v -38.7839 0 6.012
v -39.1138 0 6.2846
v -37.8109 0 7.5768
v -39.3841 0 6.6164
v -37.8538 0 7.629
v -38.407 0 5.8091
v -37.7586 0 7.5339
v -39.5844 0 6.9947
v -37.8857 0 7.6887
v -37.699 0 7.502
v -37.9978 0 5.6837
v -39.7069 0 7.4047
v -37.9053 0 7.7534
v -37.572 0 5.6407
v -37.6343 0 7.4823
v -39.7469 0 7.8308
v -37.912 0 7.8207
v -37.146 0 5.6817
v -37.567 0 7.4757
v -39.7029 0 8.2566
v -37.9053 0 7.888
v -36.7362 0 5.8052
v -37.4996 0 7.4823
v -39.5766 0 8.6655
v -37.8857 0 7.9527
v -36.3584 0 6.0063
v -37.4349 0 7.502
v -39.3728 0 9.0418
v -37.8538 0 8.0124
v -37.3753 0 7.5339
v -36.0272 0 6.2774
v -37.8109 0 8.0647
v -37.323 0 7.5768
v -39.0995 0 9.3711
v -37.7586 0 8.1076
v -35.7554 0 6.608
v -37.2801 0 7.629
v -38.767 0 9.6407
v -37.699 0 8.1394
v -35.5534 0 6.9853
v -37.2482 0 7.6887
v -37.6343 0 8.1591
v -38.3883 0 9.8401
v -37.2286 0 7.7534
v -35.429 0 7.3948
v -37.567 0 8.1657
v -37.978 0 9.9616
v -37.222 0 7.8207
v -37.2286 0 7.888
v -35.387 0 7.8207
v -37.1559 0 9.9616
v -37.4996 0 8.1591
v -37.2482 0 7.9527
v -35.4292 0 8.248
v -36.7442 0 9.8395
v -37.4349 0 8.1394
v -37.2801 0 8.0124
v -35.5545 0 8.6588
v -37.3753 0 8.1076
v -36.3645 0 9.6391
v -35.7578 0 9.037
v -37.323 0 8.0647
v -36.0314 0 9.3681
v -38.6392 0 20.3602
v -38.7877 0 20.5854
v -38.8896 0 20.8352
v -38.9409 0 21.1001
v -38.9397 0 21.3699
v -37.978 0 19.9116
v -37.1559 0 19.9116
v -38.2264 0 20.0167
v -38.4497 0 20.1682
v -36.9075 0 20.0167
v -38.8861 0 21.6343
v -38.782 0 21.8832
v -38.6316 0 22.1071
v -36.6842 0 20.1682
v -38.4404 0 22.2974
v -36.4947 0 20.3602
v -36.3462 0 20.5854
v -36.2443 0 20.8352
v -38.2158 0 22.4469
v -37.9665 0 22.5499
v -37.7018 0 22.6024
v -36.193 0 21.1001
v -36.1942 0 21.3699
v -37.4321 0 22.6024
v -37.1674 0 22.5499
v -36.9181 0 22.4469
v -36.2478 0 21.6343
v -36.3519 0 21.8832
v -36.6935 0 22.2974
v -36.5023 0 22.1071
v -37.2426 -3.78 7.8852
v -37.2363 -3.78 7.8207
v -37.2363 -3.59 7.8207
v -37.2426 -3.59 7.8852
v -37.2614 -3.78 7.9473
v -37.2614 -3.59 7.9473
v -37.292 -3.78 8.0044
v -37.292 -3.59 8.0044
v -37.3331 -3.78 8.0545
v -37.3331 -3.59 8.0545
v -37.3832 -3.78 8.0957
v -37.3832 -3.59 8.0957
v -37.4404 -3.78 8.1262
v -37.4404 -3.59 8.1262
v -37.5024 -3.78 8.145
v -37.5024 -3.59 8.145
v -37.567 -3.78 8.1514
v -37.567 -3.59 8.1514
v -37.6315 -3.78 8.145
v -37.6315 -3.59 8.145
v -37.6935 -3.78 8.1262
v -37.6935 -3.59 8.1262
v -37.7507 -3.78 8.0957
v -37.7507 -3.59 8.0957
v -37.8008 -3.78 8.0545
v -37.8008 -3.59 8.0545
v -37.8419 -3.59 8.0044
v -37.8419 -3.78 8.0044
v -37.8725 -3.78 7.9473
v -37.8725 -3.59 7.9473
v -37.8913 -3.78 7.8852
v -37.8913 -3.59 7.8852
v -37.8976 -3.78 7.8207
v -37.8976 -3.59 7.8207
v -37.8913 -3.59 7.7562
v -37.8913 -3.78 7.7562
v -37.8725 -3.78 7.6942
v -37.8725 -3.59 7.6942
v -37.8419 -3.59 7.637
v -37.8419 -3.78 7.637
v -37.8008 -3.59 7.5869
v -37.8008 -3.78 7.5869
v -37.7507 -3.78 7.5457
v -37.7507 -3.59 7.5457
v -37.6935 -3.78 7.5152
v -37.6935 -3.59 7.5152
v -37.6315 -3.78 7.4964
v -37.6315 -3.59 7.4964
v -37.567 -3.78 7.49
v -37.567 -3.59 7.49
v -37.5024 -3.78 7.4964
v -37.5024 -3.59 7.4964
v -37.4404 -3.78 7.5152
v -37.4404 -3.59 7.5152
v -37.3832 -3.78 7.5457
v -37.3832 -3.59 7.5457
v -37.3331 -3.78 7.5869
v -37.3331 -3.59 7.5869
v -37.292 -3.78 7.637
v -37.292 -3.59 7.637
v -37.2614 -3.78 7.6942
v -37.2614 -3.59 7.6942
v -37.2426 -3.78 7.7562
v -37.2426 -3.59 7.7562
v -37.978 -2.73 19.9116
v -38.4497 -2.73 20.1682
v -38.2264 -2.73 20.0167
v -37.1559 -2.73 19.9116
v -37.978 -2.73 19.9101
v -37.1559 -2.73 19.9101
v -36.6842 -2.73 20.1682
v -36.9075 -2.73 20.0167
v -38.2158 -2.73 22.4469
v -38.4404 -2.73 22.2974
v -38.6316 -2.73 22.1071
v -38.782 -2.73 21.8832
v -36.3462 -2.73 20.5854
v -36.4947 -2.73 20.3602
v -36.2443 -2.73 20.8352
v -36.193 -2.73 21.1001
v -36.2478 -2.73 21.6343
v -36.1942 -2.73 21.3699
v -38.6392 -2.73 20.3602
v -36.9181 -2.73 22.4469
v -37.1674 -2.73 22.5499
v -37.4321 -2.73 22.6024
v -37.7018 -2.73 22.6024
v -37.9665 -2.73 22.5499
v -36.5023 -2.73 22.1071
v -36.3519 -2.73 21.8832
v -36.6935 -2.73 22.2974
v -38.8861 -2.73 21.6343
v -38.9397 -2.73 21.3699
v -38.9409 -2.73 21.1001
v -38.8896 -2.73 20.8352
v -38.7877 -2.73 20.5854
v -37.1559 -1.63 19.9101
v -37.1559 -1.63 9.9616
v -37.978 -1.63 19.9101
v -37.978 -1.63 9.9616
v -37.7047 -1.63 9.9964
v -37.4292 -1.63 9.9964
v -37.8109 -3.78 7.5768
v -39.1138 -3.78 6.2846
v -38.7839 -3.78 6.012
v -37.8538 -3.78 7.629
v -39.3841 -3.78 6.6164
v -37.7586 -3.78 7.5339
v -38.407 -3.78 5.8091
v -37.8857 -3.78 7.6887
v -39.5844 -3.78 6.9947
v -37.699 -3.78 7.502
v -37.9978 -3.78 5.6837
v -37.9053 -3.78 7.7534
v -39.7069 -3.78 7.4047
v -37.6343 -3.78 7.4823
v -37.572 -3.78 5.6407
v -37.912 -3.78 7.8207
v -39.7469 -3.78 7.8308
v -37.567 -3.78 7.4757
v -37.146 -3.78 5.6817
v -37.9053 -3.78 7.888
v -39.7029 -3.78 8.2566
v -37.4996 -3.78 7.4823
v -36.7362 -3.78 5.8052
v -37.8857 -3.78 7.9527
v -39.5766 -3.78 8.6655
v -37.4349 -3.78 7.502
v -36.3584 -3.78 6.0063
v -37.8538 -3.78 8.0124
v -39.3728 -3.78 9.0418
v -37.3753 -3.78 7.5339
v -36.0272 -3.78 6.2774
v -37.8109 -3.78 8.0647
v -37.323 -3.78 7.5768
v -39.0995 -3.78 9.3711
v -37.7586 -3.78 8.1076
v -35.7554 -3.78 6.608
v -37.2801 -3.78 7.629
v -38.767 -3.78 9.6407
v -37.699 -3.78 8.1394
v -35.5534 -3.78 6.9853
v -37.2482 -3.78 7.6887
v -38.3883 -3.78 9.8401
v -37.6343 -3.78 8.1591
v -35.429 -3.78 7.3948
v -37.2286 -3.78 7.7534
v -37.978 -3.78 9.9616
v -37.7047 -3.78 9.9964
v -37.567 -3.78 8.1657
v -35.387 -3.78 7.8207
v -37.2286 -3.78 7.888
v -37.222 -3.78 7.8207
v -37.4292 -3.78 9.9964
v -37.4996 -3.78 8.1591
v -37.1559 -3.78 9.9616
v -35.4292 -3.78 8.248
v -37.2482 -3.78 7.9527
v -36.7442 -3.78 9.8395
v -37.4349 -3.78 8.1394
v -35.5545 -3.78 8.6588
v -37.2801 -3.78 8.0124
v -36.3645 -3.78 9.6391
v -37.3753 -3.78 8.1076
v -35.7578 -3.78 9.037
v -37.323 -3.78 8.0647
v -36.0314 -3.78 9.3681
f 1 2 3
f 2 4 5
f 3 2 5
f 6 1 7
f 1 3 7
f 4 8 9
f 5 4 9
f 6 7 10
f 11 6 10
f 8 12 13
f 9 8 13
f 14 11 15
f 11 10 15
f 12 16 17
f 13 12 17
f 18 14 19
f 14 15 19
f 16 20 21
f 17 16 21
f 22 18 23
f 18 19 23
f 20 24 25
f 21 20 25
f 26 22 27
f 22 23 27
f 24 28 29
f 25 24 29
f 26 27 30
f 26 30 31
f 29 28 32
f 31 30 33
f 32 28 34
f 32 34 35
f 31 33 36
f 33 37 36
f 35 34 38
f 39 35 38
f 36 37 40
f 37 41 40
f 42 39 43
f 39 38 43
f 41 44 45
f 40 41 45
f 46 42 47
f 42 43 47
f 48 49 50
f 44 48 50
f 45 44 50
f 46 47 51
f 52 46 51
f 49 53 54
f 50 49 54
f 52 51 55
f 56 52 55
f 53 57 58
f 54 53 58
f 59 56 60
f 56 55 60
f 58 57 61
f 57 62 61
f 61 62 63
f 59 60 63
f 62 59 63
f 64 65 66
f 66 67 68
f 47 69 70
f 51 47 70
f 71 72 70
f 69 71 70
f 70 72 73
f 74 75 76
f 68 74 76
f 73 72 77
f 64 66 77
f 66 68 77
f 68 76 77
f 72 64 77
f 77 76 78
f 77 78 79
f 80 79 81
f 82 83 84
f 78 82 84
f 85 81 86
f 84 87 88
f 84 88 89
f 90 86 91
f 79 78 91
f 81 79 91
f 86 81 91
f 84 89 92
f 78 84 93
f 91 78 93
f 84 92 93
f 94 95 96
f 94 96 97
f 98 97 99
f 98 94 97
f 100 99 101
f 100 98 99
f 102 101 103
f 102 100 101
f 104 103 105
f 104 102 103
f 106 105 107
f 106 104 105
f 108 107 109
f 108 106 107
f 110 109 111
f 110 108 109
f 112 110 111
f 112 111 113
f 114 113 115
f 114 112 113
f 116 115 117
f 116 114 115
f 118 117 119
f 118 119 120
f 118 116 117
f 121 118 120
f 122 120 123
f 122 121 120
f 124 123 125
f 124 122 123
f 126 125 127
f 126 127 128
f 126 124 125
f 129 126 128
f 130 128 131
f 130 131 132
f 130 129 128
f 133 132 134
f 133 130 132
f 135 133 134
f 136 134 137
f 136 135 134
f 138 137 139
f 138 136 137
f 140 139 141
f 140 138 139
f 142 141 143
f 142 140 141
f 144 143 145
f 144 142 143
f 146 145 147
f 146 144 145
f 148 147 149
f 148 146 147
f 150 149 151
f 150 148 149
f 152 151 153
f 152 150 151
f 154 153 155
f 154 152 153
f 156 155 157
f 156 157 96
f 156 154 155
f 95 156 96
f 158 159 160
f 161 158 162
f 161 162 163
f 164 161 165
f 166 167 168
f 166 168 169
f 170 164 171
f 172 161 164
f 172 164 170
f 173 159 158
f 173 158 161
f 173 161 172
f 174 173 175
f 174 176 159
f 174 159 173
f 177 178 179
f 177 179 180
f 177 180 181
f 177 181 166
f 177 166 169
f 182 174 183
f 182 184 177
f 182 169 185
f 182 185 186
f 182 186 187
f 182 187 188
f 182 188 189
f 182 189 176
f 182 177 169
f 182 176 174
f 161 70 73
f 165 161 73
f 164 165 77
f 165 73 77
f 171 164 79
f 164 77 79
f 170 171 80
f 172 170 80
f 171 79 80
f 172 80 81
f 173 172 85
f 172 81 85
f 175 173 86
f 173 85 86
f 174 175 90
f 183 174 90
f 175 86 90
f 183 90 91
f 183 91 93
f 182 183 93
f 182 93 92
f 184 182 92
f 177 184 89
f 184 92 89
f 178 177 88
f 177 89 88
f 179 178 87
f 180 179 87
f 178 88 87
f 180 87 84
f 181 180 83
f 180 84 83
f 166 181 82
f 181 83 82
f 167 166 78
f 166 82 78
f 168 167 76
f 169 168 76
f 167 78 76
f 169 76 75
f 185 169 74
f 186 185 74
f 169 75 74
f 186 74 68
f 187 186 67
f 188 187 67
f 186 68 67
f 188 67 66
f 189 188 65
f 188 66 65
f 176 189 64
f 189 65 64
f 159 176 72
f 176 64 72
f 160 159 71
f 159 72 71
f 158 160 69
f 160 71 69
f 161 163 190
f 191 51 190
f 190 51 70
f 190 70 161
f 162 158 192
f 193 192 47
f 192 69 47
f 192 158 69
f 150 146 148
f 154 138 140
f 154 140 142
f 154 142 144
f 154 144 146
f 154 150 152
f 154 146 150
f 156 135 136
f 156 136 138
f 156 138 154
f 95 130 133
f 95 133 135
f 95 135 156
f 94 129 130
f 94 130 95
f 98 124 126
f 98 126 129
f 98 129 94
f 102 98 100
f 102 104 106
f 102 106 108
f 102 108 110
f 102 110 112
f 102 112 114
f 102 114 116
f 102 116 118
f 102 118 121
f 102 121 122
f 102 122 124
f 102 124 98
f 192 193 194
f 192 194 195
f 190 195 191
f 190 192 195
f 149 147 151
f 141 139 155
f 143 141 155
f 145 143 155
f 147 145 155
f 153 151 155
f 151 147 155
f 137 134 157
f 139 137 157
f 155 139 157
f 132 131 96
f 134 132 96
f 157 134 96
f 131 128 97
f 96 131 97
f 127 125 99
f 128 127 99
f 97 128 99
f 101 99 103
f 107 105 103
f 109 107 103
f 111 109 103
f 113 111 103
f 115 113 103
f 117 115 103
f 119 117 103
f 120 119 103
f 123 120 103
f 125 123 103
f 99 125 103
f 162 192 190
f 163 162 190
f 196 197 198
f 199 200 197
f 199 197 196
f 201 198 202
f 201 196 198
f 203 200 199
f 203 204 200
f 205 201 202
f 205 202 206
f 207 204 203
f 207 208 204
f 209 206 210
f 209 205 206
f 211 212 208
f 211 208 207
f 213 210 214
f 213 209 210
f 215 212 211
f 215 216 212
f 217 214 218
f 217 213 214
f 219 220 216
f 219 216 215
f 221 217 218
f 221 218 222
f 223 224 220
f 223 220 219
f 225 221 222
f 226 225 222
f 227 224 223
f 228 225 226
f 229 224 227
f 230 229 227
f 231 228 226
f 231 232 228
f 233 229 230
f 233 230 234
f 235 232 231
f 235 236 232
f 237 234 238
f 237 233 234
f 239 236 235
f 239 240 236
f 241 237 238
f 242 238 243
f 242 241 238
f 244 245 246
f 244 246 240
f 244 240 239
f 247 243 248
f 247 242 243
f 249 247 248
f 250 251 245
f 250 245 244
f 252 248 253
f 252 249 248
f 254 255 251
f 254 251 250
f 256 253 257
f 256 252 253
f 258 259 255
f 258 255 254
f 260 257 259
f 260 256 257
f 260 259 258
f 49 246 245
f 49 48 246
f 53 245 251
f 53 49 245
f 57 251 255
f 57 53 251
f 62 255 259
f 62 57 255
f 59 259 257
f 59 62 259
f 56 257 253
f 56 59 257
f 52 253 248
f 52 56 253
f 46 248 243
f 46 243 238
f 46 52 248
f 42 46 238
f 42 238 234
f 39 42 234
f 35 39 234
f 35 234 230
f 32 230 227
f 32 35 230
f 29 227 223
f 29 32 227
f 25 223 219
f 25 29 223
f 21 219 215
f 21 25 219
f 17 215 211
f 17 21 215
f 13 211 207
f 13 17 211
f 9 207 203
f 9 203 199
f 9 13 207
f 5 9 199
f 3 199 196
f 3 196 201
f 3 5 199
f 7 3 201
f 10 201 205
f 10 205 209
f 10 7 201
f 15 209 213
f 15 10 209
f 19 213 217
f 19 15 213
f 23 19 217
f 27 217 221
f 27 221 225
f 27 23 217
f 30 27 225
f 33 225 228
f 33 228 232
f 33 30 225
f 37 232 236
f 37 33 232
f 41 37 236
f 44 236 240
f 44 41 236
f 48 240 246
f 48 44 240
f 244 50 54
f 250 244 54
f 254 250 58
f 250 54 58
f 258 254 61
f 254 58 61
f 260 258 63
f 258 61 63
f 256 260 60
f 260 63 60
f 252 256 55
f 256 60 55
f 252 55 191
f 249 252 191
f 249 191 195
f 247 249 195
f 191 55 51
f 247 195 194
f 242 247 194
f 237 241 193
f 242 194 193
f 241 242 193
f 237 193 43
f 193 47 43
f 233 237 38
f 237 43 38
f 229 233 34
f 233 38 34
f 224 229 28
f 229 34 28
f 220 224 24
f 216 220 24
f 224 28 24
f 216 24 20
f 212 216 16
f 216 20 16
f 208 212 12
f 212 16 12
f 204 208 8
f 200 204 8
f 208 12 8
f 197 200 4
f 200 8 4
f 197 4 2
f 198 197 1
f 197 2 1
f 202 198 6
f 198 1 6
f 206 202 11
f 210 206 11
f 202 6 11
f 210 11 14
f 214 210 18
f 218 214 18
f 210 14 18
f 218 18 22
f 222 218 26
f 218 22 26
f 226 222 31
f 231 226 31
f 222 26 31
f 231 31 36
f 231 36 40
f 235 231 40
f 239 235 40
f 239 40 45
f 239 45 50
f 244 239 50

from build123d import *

# Parameters (mm, degrees)
F0_R     = 0.345
F2_DEPTH = 1.89
F3_DEPTH = 1.63
F4_DEPTH = 2.73
F5_DEPTH = 1.89
F6_R     = 0.3306910567
F7_DEPTH = 0.19


with BuildPart() as f2:
    # F0 (on Front) → F2 (new body)
    with BuildSketch(Plane.XZ):
        with BuildLine():
            ThreePointArc((-37.977961816, 9.961612202), (-38.9555467493, 6.1401719986), (-35.3869509856, 7.8207081646))
            ThreePointArc((-35.3869509856, 7.8207081646), (-35.8864148197, 9.2093039283), (-37.1559401553, 9.961612202))
            ThreePointArc((-37.1559401553, 9.961612202), (-37.5669509856, 10.0007081646), (-37.977961816, 9.961612202))
        make_face()
        with Locations((-37.5669509856, 7.8207081646)):
            Circle(F0_R, mode=Mode.SUBTRACT)
    extrude(amount=F2_DEPTH)

    # F1 (on face) → F3 (join)
    with BuildSketch(Plane.XZ):
        with BuildLine():
            Line((-37.1559401553, 19.9101027101), (-37.977961816, 19.9101027101))
            Line((-37.977961816, 19.9101027101), (-37.977961816, 9.961612202))
            ThreePointArc((-37.977961816, 9.961612202), (-37.5669509856, 10.0007081646), (-37.1559401553, 9.961612202))
            Line((-37.1559401553, 9.961612202), (-37.1559401553, 19.9101027101))
        make_face()
    extrude(amount=F3_DEPTH)

    # F1 (on face) → F4 (join)
    with BuildSketch(Plane.XZ):
        with BuildLine():
            Line((-37.977961816, 19.911612202), (-37.977961816, 19.9101027101))
            Line((-37.977961816, 19.9101027101), (-37.1559401553, 19.9101027101))
            Line((-37.1559401553, 19.9101027101), (-37.1559401553, 19.911612202))
            ThreePointArc((-37.1559401553, 19.911612202), (-37.5669509856, 22.6089846236), (-37.977961816, 19.911612202))
        make_face()
    extrude(amount=F4_DEPTH)

    # F5 (add): a face of the model
    f5_faces = [f2.faces().sort_by_distance(p)[0] for p in [
        (-39.6852912743, -1.89, 7.8207081646),
    ]]
    extrude(f5_faces, amount=F5_DEPTH)


with BuildPart() as f7:
    # F6 (on face) → F7 (new body)
    with BuildSketch(Plane.XZ.offset(3.78)):
        with Locations((-37.5669509856, 7.8207081646)):
            Circle(F6_R)
    extrude(amount=-F7_DEPTH)


solid = Compound([f2.part, f7.part])
